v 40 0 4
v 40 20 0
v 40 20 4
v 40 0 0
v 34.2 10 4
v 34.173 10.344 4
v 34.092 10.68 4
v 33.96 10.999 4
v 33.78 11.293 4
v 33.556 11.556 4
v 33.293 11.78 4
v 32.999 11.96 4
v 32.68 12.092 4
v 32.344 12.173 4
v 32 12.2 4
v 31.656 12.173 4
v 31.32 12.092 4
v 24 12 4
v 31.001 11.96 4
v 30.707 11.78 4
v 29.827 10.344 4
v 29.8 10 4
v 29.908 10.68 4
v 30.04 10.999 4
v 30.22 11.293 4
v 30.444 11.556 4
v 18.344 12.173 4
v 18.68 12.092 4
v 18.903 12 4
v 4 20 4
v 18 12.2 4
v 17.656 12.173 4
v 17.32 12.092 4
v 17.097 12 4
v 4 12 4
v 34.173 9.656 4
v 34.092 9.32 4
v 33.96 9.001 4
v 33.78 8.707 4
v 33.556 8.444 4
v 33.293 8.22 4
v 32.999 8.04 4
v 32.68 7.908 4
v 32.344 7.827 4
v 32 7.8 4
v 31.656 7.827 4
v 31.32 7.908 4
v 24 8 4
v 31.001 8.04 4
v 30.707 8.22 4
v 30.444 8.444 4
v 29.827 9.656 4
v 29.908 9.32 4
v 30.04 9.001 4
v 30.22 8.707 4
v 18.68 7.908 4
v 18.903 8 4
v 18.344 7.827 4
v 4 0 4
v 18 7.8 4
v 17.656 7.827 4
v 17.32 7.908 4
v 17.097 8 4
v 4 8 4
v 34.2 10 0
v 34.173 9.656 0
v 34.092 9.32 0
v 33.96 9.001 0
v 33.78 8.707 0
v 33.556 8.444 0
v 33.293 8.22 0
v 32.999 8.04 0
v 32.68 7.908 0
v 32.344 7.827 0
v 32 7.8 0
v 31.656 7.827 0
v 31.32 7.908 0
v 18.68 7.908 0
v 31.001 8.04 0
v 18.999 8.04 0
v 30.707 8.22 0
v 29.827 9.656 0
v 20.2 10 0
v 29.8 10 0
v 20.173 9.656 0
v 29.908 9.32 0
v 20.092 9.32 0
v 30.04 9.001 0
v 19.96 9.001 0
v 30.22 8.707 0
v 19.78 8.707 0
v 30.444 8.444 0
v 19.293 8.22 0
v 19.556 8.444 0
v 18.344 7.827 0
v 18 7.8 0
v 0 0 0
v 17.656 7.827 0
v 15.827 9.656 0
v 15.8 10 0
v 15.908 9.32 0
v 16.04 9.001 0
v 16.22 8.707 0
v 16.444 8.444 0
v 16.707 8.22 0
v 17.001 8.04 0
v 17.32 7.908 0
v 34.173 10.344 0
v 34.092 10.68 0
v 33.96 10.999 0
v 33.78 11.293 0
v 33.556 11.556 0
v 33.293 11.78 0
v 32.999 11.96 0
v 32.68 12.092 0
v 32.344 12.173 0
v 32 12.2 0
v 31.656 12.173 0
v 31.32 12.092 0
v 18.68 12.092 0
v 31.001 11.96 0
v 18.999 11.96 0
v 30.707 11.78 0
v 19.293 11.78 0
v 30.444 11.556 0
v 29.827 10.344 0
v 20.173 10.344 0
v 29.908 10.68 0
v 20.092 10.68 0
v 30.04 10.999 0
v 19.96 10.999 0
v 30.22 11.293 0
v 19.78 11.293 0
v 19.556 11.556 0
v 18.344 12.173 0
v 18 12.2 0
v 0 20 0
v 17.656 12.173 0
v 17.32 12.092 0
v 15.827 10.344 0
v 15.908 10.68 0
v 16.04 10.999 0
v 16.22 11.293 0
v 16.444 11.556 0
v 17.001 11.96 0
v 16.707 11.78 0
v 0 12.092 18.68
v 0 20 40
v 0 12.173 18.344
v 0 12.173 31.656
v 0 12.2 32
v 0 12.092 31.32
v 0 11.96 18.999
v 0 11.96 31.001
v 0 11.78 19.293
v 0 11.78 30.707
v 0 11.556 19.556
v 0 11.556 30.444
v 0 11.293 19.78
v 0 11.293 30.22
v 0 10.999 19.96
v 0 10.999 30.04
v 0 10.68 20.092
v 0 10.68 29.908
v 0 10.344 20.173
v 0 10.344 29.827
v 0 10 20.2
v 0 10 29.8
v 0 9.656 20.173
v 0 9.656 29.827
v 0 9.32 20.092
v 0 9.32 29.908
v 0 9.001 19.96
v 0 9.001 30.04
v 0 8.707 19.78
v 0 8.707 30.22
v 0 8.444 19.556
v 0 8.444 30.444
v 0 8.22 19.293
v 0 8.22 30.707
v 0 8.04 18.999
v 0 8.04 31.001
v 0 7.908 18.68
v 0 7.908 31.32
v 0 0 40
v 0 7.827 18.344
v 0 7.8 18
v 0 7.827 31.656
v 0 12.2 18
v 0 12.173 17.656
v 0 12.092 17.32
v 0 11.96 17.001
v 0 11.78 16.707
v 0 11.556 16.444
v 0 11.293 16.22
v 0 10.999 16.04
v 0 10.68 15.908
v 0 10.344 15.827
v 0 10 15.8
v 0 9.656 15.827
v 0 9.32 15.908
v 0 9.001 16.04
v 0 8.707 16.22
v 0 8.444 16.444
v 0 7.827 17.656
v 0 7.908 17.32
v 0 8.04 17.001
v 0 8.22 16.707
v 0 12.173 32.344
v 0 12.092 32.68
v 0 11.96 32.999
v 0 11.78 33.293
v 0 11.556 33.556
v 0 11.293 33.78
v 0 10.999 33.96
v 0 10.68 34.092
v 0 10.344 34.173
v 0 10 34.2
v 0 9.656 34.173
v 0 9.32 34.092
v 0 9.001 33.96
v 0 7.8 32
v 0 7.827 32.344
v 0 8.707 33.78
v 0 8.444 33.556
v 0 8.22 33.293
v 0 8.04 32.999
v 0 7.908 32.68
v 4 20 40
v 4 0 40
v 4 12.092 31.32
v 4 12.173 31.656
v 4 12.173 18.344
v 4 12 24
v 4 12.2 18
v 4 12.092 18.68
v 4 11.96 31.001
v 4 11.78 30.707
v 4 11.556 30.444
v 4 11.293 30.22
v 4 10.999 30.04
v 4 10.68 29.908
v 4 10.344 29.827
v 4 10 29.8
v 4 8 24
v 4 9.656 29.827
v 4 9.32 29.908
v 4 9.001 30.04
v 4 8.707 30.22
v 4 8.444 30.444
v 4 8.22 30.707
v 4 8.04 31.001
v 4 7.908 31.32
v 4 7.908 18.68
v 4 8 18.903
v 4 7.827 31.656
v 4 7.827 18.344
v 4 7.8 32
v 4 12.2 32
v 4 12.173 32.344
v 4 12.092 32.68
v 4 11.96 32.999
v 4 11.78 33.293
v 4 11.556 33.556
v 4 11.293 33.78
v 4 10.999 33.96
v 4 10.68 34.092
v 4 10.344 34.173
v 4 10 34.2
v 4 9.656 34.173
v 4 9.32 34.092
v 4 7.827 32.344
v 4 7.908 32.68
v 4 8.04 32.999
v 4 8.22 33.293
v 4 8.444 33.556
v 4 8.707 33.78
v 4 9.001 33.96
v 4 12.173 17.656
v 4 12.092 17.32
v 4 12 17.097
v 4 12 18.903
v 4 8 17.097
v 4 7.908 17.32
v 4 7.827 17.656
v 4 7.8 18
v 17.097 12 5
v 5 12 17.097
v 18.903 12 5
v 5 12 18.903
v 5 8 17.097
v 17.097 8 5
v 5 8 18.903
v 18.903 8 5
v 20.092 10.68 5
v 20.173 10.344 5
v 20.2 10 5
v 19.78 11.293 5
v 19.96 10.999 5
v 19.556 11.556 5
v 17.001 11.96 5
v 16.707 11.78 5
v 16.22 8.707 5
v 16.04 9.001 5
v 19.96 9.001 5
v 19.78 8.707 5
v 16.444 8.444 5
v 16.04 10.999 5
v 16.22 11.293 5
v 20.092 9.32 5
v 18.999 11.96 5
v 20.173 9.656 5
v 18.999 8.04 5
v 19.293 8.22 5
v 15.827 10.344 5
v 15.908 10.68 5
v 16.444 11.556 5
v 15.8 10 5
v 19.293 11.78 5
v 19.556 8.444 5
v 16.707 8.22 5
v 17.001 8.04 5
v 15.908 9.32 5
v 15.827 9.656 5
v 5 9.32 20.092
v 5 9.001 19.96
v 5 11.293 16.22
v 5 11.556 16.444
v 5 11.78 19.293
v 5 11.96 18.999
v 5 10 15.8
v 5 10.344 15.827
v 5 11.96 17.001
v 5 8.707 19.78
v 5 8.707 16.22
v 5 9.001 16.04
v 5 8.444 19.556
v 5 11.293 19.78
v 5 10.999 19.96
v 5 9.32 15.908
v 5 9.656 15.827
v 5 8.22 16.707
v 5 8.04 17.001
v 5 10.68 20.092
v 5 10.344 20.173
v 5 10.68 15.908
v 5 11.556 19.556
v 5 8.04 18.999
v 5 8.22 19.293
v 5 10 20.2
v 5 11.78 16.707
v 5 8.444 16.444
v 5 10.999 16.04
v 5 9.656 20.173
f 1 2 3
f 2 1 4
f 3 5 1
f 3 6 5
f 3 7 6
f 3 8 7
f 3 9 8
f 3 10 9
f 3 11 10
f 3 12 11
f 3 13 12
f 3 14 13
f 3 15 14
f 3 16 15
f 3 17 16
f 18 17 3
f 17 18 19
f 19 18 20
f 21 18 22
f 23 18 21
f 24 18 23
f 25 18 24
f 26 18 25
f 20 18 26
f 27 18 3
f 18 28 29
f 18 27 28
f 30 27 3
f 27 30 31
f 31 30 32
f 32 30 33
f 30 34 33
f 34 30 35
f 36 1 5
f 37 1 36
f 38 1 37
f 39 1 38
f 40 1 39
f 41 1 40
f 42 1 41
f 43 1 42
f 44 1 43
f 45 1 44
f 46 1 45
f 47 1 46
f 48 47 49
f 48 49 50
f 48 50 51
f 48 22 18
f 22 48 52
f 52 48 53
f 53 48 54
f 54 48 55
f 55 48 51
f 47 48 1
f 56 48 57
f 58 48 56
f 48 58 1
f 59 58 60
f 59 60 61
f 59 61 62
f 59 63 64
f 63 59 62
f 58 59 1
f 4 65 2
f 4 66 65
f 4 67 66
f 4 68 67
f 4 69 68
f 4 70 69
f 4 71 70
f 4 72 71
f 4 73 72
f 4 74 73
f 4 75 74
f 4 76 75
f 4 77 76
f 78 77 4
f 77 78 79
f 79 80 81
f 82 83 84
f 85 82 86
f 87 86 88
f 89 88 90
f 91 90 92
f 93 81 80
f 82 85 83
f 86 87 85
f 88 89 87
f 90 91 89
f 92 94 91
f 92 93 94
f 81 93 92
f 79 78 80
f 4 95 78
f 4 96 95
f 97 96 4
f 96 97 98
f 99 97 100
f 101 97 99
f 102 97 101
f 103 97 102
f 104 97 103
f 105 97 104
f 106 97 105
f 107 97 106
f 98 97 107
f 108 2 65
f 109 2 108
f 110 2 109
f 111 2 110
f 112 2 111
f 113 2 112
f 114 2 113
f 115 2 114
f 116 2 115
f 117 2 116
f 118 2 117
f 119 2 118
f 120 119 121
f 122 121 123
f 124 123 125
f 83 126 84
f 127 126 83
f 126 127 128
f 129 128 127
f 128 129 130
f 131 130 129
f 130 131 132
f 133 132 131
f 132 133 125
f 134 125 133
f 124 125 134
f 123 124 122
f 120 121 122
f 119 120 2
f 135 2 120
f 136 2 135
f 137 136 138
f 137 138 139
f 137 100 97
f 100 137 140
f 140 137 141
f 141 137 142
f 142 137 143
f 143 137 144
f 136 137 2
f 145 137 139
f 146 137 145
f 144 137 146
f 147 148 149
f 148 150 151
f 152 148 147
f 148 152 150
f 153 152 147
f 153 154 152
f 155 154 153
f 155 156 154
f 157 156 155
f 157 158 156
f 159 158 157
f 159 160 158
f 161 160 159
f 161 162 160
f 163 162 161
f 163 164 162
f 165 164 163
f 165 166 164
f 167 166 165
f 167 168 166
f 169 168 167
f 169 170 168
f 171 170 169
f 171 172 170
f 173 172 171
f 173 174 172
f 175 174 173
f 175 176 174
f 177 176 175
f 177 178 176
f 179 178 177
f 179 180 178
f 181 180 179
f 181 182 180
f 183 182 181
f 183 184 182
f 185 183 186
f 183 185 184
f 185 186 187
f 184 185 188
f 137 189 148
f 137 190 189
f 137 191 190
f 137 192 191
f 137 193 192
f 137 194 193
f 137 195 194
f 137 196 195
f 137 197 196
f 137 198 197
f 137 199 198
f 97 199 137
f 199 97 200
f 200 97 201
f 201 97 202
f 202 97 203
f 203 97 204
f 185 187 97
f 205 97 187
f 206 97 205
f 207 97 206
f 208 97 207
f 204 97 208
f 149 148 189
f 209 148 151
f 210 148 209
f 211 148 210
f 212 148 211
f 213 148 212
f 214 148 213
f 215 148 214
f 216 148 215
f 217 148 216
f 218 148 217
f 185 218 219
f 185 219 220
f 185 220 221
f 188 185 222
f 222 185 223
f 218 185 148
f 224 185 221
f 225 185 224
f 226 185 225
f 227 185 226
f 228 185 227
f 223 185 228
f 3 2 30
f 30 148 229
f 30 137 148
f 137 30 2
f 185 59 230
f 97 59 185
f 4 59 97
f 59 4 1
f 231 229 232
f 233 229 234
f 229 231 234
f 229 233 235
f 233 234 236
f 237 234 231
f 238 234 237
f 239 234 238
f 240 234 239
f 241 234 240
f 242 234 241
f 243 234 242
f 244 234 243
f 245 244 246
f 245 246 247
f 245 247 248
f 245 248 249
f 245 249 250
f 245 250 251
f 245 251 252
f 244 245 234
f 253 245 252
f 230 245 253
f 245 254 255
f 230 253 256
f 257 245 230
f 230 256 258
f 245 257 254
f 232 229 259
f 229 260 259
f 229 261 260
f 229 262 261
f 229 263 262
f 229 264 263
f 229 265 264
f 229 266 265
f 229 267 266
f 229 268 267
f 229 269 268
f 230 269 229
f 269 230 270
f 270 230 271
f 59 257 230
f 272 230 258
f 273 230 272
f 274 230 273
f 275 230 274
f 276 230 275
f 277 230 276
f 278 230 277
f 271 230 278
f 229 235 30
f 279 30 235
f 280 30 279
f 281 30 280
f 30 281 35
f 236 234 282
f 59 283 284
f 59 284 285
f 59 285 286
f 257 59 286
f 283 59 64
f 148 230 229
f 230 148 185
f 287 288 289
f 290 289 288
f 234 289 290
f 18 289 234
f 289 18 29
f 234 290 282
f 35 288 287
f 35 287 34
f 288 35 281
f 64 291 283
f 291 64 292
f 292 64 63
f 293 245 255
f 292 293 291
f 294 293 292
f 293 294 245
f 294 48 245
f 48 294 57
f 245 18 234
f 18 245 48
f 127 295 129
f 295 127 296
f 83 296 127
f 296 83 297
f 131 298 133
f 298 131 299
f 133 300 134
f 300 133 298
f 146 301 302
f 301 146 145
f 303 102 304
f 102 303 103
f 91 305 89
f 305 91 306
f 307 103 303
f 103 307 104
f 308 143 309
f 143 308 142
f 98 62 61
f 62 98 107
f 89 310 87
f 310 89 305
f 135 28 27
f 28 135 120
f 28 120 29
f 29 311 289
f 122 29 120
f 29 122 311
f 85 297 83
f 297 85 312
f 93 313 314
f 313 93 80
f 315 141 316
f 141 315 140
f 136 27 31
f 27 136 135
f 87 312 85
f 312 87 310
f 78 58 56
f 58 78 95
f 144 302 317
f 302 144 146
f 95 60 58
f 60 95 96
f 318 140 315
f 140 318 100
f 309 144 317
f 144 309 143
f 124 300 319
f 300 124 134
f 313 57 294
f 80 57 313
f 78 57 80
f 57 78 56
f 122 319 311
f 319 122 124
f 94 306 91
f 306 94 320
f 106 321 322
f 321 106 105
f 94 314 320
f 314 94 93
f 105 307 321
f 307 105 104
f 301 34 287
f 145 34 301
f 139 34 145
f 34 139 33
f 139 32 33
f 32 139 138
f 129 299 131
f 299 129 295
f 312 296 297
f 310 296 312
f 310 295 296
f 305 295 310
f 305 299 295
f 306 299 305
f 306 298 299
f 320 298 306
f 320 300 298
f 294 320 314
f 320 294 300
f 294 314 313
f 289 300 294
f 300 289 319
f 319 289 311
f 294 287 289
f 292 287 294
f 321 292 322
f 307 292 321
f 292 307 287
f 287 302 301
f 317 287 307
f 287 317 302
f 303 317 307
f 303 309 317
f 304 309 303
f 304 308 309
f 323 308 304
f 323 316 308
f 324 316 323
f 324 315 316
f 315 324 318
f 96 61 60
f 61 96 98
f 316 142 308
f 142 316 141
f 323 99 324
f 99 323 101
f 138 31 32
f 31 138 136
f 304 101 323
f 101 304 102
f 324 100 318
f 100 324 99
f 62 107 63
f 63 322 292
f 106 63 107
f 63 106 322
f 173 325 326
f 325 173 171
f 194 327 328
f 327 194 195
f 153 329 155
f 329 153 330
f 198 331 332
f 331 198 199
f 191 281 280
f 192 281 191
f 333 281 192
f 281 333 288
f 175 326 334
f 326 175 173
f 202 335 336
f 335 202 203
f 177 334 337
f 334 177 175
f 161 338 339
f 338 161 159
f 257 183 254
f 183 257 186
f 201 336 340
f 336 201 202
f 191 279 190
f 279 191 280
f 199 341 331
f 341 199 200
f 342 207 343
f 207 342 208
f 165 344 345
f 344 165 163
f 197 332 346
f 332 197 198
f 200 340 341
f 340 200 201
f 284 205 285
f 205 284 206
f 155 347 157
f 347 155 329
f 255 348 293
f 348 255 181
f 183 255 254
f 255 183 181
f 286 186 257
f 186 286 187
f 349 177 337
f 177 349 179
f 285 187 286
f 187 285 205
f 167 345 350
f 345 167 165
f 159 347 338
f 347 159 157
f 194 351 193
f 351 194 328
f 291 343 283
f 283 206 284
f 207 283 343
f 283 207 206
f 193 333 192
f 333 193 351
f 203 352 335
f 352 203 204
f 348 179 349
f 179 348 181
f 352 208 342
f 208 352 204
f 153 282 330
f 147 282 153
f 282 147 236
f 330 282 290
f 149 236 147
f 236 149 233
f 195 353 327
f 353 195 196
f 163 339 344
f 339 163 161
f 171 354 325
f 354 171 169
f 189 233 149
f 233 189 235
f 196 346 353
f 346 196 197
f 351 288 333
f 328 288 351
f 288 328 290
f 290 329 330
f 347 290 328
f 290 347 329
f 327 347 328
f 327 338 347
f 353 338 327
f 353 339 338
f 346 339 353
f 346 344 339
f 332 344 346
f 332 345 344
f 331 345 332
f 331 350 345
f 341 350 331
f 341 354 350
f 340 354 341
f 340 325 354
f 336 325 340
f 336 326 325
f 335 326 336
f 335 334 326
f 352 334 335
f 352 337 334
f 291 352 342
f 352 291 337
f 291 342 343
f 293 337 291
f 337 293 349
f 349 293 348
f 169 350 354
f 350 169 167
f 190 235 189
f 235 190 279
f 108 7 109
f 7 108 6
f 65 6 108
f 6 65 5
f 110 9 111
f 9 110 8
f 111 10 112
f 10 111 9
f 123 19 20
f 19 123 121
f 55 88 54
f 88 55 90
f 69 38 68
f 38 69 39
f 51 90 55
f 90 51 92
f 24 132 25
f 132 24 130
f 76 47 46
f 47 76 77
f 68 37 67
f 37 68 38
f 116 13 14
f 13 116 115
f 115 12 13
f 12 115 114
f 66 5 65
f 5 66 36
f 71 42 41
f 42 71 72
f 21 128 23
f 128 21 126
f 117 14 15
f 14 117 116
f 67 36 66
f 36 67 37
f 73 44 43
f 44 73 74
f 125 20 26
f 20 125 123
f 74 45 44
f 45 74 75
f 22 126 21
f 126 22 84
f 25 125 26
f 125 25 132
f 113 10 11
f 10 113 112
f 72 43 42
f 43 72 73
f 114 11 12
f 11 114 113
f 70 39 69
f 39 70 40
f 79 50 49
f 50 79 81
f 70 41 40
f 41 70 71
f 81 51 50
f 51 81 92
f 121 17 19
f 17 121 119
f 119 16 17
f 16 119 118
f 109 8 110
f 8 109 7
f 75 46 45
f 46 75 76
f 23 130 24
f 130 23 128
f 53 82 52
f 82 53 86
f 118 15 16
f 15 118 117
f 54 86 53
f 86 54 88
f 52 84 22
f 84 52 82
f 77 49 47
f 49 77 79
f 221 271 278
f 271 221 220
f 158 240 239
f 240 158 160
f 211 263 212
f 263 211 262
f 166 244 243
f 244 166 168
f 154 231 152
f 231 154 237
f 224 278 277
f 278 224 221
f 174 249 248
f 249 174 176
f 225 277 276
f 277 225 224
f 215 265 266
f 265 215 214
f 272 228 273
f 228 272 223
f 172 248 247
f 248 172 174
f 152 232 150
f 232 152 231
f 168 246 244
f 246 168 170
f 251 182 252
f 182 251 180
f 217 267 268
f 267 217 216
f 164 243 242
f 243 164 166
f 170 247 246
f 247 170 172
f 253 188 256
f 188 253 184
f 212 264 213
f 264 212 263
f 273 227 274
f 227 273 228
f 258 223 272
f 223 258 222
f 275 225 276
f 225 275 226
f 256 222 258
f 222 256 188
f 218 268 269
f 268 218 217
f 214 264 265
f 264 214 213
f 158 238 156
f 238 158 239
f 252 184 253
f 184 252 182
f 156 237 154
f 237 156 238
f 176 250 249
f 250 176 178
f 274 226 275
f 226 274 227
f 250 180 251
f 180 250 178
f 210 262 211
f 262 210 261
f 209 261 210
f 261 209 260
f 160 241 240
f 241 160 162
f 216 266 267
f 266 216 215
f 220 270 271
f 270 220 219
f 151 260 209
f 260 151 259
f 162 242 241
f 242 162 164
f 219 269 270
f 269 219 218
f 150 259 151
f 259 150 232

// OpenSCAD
// 90-degree L bracket with gusset. CC0. size = leg length, hole for M4 (4.4 mm).
size = 40; width = 20; t = 4; hole = 4.4;
$fn = 40;
difference() {
  union() {
    cube([size, width, t]);
    cube([t, width, size]);
    translate([0, width / 2 - t / 2, 0]) rotate([90, 0, 0]) translate([0, 0, -t])
      linear_extrude(t) polygon([[t, t], [size * 0.6, t], [t, size * 0.6]]);
  }
  for (p = [0.45, 0.8]) {
    translate([size * p, width / 2, -1]) cylinder(d = hole, h = t + 2);
    translate([-1, width / 2, size * p]) rotate([0, 90, 0]) cylinder(d = hole, h = t + 2);
  }
}
